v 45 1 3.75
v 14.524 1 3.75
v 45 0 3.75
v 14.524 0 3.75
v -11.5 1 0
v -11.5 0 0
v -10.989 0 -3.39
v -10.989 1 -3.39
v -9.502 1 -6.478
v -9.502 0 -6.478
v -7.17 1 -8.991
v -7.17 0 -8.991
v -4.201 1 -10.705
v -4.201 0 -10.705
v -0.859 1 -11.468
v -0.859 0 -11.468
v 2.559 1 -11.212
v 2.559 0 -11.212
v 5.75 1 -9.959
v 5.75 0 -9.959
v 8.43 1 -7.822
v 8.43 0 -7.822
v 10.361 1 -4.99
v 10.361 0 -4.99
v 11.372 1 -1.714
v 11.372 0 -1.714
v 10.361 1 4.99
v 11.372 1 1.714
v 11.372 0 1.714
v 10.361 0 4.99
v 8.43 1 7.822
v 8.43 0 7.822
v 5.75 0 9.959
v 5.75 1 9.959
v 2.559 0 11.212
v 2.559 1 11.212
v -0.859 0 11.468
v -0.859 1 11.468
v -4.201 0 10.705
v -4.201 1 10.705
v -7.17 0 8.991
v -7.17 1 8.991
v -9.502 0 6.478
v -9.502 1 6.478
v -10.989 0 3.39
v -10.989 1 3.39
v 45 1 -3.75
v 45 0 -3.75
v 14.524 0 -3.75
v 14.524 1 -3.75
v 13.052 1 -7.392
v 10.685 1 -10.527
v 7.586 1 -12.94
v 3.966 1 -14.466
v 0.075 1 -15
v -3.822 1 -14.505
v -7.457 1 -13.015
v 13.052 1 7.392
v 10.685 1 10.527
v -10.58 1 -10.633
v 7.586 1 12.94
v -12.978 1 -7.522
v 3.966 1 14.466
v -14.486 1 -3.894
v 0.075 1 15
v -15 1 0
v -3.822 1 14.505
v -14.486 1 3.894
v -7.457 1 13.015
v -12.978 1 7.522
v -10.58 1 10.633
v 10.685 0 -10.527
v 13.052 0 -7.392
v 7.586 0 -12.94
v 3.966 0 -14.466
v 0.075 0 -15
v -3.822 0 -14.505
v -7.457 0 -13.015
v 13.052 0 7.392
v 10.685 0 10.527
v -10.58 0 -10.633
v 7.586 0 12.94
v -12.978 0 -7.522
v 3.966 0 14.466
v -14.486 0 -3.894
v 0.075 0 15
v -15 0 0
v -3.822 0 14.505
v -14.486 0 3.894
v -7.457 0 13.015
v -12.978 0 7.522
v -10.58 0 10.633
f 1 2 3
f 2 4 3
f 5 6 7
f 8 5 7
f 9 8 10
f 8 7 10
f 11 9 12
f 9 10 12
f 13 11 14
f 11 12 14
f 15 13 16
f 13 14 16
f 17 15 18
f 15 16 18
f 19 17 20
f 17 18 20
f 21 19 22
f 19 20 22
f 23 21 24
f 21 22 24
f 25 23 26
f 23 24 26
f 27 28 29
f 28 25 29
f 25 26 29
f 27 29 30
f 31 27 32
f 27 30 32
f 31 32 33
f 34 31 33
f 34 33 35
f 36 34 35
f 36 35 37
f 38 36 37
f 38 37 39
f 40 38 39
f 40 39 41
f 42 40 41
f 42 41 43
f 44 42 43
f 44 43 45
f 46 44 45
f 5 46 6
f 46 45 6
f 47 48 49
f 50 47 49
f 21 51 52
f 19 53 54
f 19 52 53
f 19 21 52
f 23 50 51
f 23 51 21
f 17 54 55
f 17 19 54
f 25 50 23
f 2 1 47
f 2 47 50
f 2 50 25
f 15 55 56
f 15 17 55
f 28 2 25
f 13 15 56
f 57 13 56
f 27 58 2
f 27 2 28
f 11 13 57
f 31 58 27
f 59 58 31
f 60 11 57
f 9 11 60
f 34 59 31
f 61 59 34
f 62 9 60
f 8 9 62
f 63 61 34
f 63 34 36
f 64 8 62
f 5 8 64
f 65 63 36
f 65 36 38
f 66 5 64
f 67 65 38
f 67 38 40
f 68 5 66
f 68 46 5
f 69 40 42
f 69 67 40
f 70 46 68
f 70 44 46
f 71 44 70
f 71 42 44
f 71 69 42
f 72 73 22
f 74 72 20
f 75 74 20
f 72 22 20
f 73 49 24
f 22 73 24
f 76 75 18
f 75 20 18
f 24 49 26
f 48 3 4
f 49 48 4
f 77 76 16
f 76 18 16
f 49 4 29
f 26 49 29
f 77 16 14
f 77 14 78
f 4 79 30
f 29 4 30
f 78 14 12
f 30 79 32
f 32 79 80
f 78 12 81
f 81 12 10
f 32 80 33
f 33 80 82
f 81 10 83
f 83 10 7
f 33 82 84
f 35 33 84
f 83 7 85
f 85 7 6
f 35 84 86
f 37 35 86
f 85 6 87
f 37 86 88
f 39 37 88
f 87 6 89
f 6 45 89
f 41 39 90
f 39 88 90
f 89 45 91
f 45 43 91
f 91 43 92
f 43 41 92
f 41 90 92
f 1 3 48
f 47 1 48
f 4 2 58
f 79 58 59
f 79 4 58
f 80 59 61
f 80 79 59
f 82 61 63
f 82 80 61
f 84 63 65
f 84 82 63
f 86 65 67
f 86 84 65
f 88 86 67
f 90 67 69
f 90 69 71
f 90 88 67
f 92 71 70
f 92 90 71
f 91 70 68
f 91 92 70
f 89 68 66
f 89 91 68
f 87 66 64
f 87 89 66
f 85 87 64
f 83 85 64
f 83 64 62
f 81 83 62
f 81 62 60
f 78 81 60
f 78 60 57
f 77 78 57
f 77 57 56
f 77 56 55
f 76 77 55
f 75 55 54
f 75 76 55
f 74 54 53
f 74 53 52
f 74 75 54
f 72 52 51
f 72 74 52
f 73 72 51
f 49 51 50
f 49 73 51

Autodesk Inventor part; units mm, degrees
ref_plane "YZ Plane" through (0, 0, 0) normal (1, 0, 0) x (0, 1, 0)
ref_plane "XZ Plane" through (0, 0, 0) normal (0, 1, 0) x (-1, 0, 0)
ref_plane "XY Plane" through (0, 0, 0) normal (0, 0, 1) x (1, 0, 0)
sketch "스케치1" plane through (0, 0, 0) normal (0, 1, 0) x (-1, 0, 0)
  circle A0 centre (0, 0) radius 15
  circle A1 centre (0, 0) radius 11.5
  line L0 (-14.5237, 3.75) -> (-45, 3.75)
  line L1 (-45, 3.75) -> (-45, -3.75)
  line L2 (-45, -3.75) -> (-14.5237, -3.75)
  line L3 (-14.5237, -3.75) -> (-14.5237, 3.75)
  dimension "d0" = 30
  dimension "d1" = 23
  dimension "d2" = 7.5
  dimension "d3" = 3.75
  dimension "d4" = 45
extrude "돌출1" add sketch "스케치1" along normal blind 1
properties part number "압력센서"
